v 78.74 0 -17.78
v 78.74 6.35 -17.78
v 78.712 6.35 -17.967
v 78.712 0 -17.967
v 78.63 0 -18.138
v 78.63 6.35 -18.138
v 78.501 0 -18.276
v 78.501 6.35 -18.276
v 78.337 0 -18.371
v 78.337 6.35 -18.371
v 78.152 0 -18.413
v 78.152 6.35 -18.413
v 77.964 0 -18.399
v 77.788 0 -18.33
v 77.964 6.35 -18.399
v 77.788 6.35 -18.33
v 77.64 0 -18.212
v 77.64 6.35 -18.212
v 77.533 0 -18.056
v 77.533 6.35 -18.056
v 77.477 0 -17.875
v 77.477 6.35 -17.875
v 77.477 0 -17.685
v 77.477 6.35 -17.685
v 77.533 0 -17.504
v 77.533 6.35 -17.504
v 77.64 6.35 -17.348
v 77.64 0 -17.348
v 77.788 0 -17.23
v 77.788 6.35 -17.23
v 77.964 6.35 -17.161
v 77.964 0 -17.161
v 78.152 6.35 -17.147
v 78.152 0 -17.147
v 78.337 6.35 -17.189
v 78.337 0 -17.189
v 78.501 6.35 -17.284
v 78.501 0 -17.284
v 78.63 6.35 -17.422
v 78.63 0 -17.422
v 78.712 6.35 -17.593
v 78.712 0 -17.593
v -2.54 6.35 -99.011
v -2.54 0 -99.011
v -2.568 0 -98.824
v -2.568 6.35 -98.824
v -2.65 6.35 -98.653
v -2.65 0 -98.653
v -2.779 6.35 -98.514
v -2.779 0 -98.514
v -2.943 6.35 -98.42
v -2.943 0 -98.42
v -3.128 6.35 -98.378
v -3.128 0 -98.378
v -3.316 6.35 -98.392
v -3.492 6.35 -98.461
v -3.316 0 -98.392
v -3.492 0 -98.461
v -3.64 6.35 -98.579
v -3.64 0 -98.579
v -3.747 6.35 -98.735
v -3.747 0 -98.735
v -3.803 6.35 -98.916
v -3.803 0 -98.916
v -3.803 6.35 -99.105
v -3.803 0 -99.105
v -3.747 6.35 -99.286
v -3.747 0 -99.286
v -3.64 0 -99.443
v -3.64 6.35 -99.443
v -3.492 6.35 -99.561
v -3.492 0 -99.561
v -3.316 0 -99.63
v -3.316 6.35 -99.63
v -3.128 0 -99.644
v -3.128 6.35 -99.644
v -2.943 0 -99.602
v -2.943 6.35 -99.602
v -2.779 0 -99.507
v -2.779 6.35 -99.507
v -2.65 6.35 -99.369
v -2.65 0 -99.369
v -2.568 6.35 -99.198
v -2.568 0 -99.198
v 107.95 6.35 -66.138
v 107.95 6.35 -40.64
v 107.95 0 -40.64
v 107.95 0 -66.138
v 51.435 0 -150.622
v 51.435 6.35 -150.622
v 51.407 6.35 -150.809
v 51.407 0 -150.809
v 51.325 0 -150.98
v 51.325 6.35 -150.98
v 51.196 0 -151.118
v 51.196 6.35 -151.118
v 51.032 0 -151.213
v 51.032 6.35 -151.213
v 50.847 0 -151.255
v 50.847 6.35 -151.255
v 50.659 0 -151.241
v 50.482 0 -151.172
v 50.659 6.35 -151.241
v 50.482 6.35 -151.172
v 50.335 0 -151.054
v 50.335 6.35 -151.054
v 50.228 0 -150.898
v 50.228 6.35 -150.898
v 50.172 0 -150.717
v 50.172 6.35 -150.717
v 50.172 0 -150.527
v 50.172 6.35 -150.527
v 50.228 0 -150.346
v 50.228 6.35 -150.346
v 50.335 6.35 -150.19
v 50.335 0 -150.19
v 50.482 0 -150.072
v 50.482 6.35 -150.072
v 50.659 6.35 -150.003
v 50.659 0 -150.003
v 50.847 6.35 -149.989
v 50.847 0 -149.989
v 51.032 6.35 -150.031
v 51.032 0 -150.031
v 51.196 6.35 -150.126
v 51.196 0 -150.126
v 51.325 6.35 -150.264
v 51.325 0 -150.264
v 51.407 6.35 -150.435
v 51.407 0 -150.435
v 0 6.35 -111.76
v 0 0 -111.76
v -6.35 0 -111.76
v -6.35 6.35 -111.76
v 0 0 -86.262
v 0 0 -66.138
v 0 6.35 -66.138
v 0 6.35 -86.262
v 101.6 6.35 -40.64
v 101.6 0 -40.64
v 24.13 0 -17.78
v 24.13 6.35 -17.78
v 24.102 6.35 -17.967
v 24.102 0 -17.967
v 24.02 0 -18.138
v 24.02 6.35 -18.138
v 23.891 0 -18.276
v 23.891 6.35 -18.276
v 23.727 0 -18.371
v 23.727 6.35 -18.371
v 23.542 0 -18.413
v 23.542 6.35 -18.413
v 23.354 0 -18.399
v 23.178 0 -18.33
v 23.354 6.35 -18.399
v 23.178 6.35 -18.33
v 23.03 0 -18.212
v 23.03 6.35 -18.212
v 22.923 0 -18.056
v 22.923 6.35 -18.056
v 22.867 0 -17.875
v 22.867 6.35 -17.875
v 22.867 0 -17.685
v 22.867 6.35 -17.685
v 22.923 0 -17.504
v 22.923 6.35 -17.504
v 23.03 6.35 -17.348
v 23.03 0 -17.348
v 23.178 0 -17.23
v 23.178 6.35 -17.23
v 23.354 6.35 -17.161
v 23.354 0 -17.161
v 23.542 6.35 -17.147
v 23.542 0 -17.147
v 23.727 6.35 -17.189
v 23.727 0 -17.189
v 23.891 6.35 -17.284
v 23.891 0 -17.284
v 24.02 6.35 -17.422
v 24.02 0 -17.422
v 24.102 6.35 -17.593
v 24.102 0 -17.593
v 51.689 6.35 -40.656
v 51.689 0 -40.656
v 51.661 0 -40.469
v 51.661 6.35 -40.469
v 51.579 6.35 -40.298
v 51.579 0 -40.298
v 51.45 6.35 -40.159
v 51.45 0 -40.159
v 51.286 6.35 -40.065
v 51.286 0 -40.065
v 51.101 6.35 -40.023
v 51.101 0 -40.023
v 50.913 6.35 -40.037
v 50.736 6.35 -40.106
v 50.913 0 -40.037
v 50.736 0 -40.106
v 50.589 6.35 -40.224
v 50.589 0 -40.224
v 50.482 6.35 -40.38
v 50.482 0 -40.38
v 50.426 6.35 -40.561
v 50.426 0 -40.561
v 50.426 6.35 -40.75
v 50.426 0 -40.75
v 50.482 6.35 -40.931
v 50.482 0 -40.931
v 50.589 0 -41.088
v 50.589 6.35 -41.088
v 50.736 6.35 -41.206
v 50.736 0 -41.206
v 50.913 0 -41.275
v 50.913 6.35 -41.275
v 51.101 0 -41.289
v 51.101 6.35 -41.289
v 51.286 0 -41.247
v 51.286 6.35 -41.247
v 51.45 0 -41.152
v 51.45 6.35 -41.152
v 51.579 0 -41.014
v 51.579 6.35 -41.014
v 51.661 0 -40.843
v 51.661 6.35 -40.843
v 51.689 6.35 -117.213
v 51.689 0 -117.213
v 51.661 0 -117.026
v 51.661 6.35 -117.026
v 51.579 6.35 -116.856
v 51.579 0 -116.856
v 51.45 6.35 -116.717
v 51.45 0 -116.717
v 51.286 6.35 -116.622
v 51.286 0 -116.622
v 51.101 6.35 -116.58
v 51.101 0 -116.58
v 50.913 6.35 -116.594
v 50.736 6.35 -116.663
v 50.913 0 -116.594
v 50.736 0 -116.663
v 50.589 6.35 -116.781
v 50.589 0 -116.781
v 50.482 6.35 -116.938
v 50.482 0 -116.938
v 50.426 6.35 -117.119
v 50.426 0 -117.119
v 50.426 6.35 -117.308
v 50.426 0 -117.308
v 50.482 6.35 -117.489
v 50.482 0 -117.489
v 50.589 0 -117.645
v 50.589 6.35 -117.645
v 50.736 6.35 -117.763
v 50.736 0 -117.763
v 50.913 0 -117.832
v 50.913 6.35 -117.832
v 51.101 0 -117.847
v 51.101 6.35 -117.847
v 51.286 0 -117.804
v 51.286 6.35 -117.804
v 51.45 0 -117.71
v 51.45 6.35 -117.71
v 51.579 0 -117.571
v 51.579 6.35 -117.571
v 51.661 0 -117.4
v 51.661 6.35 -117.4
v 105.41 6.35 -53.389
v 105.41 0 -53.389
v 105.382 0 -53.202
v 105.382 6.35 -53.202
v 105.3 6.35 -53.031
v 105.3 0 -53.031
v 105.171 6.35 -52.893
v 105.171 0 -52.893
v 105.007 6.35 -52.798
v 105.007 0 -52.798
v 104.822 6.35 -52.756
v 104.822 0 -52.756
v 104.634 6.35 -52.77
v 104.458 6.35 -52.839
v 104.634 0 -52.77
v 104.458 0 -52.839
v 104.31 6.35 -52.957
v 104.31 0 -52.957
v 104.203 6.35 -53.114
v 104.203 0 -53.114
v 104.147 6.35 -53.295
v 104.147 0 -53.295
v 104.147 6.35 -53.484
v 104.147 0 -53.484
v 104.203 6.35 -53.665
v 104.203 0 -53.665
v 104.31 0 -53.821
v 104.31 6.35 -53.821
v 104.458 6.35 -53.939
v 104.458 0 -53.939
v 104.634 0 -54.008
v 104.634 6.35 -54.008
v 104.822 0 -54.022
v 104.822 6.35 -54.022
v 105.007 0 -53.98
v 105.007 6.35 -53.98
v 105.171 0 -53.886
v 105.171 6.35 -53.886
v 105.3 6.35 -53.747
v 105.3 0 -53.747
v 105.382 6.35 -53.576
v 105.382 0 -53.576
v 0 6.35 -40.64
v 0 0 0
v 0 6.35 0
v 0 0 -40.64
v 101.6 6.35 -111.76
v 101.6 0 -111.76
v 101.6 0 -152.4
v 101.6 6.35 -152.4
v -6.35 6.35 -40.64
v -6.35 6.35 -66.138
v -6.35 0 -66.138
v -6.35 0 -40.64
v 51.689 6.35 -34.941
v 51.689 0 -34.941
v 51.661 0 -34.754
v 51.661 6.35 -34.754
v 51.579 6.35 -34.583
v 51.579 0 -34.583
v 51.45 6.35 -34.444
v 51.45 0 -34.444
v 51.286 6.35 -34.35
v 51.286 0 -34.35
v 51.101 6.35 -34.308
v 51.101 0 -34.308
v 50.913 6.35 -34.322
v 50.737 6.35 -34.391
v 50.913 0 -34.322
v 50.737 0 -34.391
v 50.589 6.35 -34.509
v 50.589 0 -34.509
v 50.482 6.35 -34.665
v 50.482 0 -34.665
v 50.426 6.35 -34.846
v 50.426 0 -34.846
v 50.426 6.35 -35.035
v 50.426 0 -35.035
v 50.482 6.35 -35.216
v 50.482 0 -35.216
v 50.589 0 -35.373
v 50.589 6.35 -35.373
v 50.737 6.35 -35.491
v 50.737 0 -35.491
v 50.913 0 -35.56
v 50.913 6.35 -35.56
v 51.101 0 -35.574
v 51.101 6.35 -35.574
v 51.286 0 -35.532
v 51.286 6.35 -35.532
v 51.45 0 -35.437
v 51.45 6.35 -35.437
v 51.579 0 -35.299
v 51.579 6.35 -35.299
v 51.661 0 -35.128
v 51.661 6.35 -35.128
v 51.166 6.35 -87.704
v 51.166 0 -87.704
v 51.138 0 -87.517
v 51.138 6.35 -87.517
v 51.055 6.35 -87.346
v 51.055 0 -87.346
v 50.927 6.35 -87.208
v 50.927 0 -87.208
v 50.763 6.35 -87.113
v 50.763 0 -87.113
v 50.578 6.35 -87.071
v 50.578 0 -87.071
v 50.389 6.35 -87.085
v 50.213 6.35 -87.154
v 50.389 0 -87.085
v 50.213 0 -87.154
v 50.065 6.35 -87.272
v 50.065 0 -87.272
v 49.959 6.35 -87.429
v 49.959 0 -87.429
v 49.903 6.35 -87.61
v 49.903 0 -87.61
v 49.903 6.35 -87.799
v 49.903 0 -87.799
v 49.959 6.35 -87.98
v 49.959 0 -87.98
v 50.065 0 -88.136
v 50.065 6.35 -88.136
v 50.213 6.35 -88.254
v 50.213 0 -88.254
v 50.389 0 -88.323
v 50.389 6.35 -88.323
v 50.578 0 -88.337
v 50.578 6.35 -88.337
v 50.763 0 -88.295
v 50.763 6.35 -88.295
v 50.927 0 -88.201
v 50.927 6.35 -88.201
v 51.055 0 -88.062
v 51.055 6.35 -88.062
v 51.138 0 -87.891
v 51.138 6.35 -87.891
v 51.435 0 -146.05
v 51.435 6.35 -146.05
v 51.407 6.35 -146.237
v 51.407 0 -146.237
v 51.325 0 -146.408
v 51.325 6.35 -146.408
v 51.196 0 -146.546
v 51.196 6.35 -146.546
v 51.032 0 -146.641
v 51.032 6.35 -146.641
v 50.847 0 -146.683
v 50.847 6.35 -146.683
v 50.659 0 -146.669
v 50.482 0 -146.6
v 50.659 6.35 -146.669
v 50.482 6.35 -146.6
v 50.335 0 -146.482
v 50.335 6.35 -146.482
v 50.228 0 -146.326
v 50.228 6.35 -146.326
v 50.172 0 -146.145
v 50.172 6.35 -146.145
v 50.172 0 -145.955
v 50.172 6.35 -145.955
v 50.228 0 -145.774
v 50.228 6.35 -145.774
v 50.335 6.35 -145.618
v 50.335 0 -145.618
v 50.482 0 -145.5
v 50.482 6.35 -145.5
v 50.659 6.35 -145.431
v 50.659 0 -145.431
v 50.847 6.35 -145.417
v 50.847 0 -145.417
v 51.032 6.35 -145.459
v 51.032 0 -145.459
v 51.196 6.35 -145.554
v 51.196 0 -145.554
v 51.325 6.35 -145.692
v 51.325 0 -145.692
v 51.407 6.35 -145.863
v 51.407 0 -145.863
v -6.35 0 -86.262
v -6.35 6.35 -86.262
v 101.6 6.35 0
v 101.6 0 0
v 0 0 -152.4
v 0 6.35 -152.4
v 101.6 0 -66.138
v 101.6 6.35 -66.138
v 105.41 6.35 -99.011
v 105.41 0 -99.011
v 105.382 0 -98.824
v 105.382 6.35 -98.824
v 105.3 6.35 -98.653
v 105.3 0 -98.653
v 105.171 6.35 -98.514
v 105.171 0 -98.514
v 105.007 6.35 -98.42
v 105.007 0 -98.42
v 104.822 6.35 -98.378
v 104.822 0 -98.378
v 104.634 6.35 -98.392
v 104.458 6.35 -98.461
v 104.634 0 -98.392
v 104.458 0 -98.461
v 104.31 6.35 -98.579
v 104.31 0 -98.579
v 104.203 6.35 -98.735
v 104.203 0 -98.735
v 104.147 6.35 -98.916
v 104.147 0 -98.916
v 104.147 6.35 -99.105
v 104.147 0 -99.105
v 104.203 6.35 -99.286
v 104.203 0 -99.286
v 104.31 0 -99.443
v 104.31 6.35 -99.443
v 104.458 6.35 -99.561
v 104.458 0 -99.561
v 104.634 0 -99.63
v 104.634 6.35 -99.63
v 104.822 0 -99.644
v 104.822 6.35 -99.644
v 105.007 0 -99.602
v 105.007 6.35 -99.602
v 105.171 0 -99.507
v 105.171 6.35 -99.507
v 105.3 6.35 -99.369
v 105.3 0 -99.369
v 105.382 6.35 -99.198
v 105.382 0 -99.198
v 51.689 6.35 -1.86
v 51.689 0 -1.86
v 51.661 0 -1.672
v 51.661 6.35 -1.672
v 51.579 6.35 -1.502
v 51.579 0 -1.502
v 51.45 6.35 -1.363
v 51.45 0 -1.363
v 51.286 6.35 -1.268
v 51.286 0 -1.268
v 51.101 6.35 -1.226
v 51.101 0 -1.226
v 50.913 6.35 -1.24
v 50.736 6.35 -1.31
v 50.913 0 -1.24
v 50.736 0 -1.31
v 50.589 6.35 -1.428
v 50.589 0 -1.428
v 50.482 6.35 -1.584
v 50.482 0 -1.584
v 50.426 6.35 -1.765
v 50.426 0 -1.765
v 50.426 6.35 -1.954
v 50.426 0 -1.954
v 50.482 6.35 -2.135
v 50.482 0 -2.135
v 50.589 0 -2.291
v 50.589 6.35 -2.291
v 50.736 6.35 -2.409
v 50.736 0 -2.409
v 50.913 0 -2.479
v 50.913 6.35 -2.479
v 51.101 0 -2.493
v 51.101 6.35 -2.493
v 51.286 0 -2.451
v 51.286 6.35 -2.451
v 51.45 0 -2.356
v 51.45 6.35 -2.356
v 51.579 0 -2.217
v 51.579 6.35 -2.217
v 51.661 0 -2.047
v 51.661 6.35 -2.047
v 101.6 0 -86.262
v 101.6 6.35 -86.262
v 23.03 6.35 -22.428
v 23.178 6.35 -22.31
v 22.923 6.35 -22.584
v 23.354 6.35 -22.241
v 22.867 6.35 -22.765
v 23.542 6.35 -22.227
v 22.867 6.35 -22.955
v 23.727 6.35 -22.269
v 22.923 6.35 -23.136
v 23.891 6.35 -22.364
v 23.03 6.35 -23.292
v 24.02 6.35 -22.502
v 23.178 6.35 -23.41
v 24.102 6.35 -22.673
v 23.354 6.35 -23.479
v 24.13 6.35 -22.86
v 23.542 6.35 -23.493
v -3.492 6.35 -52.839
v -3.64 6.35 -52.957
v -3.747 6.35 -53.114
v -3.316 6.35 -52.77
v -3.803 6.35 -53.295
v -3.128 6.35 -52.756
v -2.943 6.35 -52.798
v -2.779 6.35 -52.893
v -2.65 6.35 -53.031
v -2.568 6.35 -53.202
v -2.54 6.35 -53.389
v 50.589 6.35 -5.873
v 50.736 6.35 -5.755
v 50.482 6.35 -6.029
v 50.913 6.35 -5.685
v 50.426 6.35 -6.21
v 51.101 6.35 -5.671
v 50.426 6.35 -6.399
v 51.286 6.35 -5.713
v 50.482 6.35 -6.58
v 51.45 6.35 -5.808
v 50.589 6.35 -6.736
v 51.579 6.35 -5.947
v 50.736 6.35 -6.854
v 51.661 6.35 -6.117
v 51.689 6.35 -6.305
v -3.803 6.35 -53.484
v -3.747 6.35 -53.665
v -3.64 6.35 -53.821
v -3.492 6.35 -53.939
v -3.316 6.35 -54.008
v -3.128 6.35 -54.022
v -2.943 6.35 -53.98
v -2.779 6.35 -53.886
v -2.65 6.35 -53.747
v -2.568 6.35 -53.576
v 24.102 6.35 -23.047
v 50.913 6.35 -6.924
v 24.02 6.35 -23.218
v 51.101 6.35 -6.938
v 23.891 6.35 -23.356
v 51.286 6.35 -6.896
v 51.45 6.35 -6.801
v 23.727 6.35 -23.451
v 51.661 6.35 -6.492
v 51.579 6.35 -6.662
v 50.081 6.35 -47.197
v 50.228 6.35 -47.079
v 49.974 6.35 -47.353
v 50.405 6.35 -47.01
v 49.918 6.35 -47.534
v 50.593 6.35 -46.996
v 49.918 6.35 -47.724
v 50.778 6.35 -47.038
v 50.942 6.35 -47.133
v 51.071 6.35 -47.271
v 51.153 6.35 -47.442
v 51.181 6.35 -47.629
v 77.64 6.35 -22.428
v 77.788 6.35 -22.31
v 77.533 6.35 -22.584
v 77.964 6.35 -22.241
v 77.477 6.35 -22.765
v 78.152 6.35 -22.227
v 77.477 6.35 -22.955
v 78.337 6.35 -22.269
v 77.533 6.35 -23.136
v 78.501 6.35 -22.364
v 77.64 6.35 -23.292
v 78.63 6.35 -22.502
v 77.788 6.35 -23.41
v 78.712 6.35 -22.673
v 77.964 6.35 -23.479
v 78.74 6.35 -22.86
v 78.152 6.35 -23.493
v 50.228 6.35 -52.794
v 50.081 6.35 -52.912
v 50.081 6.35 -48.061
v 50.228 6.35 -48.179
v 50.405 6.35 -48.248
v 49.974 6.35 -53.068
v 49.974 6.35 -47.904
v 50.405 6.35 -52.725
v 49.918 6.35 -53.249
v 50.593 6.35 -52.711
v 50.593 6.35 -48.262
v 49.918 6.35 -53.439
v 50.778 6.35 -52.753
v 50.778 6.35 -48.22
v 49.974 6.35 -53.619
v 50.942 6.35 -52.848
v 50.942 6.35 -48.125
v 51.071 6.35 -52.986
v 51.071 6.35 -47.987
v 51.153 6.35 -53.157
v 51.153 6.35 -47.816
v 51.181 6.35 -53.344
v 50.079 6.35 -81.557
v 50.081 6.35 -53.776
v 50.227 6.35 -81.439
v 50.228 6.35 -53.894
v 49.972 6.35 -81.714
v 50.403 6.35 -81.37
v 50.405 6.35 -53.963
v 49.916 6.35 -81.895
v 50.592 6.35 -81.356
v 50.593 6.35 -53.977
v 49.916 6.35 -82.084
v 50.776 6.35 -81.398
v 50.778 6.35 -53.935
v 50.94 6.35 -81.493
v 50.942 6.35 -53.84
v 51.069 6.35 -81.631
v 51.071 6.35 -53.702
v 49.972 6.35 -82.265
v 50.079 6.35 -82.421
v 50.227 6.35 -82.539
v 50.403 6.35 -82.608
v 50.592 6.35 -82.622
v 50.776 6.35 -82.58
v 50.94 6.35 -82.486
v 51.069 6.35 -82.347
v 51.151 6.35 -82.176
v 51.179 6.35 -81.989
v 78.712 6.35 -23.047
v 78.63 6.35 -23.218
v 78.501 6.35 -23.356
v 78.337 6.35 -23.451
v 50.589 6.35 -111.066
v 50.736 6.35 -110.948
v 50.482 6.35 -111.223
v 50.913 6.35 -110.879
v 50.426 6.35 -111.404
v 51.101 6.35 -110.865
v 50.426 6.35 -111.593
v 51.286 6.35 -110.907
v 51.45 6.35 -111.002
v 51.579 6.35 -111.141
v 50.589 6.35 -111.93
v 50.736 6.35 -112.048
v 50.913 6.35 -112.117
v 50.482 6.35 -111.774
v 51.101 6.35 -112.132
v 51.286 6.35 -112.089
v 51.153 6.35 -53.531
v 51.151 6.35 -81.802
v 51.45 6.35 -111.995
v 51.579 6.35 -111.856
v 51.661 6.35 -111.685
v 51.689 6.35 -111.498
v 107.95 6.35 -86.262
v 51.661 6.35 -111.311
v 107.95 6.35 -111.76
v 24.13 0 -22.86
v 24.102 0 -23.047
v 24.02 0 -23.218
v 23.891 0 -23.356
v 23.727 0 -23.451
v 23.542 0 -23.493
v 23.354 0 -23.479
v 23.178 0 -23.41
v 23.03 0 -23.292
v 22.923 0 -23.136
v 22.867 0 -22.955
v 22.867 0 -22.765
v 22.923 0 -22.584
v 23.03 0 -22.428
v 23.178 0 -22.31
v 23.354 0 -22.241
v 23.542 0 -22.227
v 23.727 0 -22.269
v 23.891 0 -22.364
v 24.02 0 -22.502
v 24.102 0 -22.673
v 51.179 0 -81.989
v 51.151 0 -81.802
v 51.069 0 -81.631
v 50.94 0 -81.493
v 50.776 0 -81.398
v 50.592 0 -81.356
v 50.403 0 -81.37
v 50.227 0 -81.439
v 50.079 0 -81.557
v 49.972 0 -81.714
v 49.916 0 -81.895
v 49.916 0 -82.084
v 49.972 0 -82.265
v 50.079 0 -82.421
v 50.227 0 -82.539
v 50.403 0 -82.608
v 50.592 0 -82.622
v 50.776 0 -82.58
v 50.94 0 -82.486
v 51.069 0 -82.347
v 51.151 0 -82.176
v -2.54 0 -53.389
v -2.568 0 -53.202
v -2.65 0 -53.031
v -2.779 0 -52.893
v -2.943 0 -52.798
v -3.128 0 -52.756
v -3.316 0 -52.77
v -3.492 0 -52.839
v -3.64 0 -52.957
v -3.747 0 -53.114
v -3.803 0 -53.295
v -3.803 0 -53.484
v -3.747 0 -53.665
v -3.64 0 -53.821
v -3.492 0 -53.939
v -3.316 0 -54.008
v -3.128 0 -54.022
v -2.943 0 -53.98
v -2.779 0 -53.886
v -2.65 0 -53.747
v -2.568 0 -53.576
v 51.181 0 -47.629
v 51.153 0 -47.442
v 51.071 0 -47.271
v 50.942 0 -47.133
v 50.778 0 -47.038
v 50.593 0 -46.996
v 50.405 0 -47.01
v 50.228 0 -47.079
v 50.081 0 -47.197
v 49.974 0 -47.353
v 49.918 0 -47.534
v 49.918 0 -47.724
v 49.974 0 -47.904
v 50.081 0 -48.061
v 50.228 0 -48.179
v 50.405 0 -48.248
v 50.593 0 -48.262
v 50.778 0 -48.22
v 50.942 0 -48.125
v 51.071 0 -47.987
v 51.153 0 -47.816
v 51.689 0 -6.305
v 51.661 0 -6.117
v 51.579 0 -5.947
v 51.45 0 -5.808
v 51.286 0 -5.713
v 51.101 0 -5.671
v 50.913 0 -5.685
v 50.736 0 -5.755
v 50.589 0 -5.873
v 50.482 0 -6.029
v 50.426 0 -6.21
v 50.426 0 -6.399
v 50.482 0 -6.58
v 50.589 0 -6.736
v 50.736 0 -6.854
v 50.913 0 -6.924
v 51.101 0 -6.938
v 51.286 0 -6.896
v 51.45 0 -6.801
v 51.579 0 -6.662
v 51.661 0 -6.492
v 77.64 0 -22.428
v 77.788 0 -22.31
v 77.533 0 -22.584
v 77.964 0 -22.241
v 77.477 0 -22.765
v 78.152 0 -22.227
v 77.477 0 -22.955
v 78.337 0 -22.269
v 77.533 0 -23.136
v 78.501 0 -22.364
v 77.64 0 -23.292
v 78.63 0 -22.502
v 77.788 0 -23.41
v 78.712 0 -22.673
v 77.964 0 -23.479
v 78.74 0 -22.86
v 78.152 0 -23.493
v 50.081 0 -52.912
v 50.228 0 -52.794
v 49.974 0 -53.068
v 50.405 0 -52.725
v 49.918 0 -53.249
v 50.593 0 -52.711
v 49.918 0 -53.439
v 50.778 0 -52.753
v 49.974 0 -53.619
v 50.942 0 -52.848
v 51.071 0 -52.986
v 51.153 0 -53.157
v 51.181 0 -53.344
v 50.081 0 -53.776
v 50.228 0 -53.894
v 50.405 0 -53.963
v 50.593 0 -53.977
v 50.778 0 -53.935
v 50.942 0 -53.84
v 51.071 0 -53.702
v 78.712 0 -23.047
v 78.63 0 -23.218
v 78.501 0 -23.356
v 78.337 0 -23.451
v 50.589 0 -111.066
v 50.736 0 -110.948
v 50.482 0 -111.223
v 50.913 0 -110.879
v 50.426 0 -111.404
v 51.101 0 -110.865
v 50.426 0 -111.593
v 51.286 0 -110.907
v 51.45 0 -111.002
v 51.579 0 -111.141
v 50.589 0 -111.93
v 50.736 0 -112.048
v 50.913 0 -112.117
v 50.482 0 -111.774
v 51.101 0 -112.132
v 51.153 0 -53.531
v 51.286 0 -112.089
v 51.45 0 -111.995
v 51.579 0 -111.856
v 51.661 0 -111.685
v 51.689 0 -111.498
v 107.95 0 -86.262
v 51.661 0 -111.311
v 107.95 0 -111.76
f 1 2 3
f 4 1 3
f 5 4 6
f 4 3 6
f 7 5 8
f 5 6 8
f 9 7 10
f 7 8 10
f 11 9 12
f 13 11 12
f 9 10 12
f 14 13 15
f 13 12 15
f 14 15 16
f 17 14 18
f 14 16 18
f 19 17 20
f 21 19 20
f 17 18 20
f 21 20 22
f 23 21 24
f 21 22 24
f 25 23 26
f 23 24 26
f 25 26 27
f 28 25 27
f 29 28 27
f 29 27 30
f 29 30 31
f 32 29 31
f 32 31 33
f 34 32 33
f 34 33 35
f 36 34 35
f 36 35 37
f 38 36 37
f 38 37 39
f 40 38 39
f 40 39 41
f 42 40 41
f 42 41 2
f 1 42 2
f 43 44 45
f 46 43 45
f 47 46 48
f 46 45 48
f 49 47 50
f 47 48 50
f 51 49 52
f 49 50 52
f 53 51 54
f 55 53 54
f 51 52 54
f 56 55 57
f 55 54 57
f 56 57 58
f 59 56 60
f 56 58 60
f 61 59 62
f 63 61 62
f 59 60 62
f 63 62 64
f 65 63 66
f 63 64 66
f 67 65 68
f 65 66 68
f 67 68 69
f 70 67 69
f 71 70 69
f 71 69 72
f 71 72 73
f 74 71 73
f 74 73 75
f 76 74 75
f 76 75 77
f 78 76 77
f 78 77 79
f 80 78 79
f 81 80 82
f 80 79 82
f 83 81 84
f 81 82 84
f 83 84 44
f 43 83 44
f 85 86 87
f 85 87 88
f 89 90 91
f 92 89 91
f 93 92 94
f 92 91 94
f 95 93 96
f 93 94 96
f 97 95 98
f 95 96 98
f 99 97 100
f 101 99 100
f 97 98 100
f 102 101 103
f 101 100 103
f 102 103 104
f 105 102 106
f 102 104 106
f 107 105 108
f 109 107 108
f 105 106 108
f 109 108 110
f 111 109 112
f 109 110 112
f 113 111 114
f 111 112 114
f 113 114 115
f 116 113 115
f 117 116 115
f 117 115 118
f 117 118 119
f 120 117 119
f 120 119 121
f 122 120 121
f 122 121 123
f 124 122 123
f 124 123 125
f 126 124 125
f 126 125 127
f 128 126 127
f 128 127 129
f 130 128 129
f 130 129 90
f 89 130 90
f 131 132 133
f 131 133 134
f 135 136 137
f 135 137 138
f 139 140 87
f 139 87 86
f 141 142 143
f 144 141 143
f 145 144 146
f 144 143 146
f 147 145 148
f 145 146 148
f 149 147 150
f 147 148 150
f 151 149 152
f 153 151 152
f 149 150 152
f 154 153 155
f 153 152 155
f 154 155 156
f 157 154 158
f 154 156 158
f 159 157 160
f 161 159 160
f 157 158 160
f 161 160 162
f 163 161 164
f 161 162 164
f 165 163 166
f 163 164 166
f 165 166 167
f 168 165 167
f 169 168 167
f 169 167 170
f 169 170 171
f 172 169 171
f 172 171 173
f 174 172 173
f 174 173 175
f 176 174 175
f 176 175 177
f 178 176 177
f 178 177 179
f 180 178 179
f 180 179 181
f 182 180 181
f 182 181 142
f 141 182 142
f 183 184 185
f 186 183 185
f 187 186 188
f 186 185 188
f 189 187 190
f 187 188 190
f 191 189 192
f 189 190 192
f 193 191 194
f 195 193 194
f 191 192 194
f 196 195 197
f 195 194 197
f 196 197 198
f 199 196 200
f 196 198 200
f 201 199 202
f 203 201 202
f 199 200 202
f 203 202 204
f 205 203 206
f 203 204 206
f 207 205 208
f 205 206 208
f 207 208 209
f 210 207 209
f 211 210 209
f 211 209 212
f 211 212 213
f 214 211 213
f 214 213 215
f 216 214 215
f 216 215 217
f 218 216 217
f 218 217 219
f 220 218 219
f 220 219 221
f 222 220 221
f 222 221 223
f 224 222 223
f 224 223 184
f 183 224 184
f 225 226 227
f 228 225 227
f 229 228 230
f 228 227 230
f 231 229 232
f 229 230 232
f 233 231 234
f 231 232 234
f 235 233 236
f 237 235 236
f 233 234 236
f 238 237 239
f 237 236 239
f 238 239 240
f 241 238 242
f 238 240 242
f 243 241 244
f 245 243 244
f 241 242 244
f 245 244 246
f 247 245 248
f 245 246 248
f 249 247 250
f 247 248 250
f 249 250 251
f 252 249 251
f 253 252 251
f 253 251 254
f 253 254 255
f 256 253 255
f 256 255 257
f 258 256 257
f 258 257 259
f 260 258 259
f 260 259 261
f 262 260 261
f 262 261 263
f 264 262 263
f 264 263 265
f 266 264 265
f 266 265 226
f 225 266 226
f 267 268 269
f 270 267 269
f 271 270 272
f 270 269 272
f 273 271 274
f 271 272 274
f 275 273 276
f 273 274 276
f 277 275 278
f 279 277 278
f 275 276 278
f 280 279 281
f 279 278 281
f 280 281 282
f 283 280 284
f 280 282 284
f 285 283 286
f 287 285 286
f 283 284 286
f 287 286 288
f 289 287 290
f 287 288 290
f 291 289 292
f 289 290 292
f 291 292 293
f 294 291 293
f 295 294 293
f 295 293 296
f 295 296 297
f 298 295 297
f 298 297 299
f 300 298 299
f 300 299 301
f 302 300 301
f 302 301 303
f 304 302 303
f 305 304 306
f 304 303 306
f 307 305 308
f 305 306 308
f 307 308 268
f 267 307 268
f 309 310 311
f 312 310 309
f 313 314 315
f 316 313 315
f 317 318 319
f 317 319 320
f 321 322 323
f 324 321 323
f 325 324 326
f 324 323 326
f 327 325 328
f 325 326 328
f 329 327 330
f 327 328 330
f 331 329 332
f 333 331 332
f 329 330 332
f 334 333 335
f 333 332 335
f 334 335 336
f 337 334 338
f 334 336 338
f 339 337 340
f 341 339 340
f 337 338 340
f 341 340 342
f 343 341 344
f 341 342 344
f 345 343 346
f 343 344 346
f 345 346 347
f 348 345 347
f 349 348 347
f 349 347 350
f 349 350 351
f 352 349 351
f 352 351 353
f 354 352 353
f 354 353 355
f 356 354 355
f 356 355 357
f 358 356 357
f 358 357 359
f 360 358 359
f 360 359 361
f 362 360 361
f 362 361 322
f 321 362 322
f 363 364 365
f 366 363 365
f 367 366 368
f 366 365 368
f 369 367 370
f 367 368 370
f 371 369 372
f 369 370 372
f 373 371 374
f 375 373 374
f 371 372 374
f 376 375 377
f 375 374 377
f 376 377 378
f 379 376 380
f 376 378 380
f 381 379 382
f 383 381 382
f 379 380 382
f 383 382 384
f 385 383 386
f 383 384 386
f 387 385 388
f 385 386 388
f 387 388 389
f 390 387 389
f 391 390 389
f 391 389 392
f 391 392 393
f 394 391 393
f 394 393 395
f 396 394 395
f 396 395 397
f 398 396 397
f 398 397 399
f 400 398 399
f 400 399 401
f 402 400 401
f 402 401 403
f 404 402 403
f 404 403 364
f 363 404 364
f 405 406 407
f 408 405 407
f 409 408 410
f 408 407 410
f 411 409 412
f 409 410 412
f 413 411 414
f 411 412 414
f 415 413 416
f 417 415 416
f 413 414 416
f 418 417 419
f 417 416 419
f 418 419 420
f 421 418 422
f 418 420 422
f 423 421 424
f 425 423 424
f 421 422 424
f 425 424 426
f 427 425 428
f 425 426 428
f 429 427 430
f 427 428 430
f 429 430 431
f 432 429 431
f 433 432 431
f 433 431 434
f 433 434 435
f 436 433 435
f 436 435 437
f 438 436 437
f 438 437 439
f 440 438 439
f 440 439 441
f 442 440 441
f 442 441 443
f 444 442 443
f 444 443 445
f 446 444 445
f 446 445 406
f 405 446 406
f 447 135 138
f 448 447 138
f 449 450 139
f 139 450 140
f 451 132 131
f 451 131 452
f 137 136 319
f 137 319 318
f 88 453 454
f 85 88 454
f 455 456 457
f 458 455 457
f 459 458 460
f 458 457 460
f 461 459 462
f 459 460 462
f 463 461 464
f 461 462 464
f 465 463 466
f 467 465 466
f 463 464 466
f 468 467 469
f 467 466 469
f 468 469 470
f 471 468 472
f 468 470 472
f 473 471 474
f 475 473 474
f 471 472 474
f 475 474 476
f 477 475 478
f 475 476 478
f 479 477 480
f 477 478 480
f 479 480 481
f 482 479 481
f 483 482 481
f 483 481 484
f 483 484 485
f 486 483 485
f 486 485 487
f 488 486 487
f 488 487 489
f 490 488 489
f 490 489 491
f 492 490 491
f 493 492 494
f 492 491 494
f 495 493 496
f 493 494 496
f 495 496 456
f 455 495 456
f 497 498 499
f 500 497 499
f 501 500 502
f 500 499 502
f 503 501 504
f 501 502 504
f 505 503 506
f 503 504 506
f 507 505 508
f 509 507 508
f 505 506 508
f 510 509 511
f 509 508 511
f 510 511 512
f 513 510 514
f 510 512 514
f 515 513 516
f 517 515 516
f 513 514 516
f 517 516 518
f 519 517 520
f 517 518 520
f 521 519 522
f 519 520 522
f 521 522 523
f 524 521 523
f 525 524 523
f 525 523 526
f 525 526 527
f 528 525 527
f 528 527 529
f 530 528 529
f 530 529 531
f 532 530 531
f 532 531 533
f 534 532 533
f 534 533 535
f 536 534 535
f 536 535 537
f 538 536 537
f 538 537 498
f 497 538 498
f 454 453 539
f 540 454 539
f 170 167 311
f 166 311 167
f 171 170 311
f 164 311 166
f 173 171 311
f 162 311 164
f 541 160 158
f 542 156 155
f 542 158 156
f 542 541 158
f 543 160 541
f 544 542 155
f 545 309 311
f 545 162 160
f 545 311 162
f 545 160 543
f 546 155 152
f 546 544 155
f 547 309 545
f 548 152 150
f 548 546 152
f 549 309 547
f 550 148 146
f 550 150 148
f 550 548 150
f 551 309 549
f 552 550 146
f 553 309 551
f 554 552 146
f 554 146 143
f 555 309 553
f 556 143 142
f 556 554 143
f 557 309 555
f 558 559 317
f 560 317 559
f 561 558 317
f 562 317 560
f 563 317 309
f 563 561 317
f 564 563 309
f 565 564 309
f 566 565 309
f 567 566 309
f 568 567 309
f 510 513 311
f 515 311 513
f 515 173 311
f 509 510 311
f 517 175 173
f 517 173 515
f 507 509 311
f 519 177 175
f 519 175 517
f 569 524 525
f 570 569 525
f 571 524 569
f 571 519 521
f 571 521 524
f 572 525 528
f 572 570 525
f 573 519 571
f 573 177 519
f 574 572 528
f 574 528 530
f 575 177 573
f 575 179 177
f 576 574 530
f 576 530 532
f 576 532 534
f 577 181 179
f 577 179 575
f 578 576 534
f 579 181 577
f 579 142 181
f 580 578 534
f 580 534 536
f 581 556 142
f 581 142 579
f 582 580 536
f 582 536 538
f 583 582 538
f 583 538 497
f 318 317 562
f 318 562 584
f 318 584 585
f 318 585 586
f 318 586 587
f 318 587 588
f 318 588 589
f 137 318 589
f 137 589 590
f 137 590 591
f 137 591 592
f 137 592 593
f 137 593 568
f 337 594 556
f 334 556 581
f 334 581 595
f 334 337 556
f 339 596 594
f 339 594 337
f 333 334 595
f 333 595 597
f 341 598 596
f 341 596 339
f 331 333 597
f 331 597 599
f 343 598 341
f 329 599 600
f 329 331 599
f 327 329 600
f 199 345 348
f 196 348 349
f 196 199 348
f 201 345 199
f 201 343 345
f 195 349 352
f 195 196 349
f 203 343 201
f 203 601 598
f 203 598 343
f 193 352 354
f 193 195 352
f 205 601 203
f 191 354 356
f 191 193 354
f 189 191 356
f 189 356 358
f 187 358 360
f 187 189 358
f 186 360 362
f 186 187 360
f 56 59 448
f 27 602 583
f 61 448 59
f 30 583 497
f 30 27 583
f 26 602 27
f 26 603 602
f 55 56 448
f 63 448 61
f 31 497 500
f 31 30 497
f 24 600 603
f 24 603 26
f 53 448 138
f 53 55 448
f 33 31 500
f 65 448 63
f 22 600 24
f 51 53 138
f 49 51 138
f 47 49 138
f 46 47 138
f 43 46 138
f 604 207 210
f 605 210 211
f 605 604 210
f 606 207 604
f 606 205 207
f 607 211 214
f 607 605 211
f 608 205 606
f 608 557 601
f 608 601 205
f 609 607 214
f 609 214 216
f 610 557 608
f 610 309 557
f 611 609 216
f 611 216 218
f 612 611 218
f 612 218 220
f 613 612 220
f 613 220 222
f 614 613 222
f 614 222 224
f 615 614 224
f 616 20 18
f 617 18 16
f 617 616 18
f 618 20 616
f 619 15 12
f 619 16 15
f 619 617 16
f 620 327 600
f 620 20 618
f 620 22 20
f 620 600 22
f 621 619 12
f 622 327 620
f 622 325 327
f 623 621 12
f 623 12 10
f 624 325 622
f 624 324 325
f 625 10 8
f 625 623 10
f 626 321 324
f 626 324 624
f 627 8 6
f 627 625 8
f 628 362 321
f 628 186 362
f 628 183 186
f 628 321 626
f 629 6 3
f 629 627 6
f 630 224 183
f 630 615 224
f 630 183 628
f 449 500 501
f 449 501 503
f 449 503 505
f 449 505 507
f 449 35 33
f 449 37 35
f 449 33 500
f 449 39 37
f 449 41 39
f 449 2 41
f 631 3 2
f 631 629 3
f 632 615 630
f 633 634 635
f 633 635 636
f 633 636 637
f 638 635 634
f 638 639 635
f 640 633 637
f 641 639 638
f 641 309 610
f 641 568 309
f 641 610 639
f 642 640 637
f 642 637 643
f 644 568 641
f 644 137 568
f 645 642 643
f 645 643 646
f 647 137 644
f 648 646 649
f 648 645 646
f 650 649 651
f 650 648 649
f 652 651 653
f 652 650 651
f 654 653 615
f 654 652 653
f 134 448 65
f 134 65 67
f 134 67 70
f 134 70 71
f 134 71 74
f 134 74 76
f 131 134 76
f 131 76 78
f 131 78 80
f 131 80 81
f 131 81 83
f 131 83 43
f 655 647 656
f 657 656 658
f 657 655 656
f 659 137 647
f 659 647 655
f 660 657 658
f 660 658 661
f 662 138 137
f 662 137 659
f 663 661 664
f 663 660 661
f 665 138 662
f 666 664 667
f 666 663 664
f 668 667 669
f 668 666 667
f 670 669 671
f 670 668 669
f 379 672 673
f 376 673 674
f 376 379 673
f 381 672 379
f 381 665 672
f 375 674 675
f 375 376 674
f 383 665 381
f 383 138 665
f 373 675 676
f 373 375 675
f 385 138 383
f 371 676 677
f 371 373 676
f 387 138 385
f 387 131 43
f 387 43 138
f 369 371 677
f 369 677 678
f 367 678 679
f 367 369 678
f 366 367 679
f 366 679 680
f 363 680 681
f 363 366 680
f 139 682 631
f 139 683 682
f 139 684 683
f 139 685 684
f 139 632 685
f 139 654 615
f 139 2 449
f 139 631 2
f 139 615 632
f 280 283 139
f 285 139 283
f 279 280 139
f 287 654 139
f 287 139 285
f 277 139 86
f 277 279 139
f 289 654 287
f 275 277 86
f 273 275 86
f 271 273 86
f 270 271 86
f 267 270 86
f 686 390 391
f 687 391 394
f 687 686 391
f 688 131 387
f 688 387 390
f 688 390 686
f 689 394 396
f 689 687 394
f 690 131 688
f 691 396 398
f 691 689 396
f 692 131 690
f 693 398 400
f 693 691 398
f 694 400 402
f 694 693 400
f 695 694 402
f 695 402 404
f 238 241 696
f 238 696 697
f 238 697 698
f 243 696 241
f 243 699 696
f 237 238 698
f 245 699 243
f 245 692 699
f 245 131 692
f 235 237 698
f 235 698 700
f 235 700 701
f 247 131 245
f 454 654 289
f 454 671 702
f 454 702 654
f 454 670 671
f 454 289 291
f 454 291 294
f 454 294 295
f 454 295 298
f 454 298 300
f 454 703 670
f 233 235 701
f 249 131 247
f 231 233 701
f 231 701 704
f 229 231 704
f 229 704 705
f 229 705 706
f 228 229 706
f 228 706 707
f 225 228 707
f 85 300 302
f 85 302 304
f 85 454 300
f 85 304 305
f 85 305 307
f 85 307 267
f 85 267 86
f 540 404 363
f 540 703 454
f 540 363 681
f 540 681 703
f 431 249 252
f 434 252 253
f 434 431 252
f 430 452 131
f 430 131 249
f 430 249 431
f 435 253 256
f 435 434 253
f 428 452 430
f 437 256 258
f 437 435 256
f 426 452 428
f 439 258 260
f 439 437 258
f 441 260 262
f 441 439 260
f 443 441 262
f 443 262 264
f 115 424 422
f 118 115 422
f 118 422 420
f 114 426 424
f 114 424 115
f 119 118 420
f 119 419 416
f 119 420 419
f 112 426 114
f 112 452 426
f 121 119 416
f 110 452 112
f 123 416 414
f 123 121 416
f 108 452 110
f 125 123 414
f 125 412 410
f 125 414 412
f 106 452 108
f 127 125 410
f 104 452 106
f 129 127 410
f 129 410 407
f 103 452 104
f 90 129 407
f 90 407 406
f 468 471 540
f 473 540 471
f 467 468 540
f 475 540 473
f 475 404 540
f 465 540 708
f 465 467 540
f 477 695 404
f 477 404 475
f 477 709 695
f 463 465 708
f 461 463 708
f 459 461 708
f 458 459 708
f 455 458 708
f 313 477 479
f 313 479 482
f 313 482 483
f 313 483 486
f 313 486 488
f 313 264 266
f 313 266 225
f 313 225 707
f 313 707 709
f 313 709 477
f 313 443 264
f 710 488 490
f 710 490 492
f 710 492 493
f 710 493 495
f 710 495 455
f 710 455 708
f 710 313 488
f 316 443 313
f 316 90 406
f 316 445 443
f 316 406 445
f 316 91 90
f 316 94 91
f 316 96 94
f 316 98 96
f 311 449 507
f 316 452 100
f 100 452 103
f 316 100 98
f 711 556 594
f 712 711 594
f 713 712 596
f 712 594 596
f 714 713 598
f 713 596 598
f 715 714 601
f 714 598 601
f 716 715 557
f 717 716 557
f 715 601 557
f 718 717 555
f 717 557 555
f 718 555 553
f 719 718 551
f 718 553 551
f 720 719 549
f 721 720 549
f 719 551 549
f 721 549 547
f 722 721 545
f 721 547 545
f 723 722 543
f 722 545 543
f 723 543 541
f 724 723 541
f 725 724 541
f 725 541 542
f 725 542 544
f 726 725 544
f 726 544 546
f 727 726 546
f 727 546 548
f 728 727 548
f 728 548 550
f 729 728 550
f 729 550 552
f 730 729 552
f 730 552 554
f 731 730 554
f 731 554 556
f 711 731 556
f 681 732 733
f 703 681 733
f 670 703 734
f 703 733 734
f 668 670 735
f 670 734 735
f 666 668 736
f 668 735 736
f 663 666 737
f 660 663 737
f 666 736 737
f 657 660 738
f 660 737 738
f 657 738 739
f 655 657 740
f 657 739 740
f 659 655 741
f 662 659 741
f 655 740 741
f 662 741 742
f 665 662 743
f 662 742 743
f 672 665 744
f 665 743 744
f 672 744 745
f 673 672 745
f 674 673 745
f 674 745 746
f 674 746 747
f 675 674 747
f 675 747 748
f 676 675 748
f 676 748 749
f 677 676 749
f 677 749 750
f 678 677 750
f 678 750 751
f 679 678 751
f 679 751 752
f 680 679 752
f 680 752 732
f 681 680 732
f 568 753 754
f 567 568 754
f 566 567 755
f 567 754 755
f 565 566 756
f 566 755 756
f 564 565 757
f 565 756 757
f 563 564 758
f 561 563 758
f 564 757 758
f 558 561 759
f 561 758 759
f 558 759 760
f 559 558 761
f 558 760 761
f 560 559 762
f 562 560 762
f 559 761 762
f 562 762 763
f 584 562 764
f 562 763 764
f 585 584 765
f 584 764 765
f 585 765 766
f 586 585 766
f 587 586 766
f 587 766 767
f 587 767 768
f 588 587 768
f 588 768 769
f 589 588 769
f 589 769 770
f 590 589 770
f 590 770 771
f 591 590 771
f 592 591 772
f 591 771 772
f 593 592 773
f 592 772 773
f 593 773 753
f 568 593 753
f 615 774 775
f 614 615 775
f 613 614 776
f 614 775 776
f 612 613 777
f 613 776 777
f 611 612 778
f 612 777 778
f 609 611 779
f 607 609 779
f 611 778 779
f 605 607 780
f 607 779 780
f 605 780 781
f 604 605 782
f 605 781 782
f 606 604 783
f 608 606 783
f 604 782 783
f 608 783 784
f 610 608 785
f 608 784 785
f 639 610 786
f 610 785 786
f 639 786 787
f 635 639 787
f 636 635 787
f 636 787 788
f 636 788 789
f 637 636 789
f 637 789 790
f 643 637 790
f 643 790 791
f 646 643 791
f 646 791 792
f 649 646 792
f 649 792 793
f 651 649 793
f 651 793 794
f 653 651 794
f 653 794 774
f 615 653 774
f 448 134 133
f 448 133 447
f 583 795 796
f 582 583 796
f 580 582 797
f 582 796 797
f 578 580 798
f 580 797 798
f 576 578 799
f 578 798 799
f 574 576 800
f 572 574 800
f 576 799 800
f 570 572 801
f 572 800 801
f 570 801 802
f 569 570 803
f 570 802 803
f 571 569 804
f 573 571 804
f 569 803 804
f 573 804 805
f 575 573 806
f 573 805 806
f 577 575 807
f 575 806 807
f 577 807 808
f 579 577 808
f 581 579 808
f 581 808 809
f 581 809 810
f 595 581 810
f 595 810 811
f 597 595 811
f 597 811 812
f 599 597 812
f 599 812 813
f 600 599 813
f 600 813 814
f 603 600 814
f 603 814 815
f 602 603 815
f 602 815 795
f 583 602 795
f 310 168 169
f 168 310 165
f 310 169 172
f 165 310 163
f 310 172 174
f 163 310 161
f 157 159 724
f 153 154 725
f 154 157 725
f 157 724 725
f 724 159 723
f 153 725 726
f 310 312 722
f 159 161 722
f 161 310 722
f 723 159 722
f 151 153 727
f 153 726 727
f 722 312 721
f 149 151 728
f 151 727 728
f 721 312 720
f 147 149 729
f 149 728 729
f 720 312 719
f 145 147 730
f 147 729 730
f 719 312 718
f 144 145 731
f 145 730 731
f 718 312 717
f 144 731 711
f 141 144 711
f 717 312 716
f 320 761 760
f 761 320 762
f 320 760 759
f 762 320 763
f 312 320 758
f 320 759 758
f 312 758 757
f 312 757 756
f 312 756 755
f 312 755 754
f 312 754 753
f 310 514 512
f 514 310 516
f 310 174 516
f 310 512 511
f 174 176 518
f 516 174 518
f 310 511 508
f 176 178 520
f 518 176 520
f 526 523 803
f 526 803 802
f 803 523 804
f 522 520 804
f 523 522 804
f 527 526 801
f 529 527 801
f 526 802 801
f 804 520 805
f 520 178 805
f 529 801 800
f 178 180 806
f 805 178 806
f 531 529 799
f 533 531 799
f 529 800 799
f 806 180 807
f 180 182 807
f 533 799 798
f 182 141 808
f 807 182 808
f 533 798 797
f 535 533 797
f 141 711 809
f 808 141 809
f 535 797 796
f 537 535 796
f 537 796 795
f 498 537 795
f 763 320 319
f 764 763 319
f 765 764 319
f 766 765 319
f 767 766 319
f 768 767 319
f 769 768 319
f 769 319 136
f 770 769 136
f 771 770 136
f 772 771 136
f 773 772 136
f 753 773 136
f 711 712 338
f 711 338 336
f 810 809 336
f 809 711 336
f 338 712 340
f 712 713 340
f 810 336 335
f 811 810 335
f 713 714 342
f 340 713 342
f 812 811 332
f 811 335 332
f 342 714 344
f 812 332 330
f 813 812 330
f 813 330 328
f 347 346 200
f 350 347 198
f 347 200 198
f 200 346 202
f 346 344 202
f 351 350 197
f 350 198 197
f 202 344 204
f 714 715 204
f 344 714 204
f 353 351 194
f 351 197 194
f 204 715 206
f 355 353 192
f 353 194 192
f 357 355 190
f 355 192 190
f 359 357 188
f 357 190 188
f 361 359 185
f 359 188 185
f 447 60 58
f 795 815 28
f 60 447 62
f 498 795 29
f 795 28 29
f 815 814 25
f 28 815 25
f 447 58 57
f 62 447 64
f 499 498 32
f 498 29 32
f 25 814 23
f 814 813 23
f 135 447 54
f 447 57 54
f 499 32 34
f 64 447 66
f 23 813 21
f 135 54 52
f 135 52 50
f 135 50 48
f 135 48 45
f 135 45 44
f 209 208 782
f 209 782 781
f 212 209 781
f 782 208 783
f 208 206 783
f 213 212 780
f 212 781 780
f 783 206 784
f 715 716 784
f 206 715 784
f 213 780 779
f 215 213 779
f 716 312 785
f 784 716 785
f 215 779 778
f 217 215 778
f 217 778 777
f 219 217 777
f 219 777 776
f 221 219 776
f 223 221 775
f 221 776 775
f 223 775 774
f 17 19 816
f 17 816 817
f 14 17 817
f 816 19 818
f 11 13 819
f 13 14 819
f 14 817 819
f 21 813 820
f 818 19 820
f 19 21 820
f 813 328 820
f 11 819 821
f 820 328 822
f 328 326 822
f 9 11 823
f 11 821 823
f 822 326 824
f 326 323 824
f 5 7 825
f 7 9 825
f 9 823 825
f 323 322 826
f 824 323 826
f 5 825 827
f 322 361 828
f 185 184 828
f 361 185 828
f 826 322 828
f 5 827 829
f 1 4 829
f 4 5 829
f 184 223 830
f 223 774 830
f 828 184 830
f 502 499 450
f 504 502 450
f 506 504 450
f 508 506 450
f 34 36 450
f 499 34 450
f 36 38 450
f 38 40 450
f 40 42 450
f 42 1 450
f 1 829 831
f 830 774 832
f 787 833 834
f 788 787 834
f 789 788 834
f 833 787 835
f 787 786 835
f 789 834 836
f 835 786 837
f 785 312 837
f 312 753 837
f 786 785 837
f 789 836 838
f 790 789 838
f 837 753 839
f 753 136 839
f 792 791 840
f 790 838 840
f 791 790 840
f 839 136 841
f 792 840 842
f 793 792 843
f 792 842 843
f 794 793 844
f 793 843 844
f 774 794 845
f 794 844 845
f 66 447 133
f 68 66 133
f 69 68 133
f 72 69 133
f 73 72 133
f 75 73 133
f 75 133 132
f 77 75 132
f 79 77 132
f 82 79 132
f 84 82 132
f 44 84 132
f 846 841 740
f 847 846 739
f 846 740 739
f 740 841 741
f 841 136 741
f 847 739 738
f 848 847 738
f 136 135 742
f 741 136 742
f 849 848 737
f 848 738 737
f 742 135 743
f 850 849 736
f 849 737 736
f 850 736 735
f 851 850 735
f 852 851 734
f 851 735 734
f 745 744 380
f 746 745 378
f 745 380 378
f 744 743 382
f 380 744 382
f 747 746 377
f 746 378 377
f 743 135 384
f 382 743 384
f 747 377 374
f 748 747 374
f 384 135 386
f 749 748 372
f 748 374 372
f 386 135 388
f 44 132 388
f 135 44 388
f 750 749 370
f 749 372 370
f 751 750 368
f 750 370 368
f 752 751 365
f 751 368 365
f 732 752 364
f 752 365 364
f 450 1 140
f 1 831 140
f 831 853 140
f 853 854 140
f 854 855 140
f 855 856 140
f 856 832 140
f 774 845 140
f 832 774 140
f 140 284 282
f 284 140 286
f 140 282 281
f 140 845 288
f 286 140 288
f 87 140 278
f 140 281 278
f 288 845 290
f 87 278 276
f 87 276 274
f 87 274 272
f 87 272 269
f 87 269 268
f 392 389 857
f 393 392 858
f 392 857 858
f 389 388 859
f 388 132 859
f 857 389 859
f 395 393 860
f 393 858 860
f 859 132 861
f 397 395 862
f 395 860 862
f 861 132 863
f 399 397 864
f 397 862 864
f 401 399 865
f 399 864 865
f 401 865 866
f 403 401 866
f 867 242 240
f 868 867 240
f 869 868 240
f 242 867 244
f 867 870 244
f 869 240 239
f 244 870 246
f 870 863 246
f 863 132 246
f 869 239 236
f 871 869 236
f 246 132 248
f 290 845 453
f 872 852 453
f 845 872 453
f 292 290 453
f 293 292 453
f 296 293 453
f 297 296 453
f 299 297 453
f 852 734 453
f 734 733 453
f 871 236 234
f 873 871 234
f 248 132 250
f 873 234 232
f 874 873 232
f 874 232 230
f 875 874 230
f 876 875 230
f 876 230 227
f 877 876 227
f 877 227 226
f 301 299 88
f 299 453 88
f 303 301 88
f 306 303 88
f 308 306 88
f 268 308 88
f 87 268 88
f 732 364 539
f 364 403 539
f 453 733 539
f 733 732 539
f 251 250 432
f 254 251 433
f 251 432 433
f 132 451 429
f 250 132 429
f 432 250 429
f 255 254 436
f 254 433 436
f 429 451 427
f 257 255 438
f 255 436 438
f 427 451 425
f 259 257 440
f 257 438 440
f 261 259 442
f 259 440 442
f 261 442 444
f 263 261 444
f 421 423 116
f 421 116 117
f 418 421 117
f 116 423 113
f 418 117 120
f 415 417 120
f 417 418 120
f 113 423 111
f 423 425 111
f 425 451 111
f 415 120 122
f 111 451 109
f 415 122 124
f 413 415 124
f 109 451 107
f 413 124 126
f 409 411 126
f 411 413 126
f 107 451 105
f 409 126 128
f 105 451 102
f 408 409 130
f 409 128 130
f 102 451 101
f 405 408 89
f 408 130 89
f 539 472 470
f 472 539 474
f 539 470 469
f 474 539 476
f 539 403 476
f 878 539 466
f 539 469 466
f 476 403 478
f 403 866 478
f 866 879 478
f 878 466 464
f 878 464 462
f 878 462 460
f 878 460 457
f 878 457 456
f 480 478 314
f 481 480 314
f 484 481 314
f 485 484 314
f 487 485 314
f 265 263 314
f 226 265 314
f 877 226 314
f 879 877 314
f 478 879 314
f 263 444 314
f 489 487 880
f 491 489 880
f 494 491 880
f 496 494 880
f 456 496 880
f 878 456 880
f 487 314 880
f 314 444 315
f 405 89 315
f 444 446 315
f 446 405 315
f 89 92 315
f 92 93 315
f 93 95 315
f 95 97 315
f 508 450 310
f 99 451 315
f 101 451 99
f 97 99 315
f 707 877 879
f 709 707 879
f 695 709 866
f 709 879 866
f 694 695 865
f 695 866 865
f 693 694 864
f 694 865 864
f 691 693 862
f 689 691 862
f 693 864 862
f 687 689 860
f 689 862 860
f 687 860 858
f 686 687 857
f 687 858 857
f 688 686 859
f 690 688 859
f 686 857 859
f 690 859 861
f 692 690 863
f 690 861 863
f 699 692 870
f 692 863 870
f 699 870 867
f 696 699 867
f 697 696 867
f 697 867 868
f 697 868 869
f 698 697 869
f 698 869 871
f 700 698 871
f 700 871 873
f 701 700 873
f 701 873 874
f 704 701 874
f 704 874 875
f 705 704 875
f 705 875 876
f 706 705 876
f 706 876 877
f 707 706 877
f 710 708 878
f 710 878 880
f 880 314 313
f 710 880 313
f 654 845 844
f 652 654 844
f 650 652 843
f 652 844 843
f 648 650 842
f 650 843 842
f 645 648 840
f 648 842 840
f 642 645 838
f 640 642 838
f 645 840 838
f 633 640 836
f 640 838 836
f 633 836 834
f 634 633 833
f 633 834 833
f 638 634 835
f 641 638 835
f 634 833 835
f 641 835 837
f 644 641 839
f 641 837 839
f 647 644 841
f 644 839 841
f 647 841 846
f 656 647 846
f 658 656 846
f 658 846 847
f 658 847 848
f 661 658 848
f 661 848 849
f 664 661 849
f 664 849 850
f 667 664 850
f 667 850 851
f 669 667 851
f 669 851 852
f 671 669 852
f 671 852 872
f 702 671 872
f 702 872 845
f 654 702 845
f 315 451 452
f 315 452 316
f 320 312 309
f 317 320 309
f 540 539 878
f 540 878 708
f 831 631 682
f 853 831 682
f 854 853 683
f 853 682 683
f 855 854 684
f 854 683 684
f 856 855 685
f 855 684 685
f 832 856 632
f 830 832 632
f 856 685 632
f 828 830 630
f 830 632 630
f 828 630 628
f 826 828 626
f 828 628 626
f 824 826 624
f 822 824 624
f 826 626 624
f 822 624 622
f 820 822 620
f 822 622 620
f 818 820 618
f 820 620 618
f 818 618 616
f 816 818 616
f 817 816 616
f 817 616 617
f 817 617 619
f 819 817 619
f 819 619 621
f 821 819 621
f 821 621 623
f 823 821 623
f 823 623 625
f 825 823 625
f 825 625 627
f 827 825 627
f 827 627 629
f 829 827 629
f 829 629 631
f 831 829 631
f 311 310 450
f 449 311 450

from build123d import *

# Parameters (mm, degrees)
SKETCH1_W           = 101.6
SKETCH1_H           = 152.4
BOSS_EXTRUDE1_DEPTH = 6.35
SKETCH2_W           = 25.498289586
SKETCH2_H           = 6.35
BOSS_EXTRUDE2_DEPTH = 6.35
SKETCH3_W           = 25.498289586
SKETCH3_H           = 6.35
BOSS_EXTRUDE3_DEPTH = 6.35
SKETCH4_R           = 0.635
CUT_EXTRUDE1_DEPTH  = 6.35
SKETCH5_R           = 0.635
CUT_EXTRUDE2_DEPTH  = 7.35
SKETCH7_R           = 0.635
CUT_EXTRUDE3_DEPTH  = 7.35
SKETCH9_R           = 0.635
CUT_EXTRUDE4_DEPTH  = 7.35


with BuildPart() as part:
    # Sketch1 → Boss-Extrude1 (new body)
    with BuildSketch(Plane(origin=(0, 0, 0), x_dir=(1, 0, 0), z_dir=(0, 1, 0))):
        with Locations((50.8, 76.2)):
            Rectangle(SKETCH1_W, SKETCH1_H)
    extrude(amount=BOSS_EXTRUDE1_DEPTH)

    # Sketch2 → Boss-Extrude2 (add)
    with BuildSketch(Plane(origin=(101.6, 0, 0), x_dir=(0, 0, -1), z_dir=(1, 0, 0))):
        with Locations((53.389144793, 3.175)):
            Rectangle(SKETCH2_W, SKETCH2_H)
        with Locations((99.010855207, 3.175)):
            Rectangle(SKETCH2_W, SKETCH2_H)
    extrude(amount=BOSS_EXTRUDE2_DEPTH)

    # Sketch3 → Boss-Extrude3 (add)
    with BuildSketch(Plane.ZY):
        with Locations((-99.010855207, 3.175)):
            Rectangle(SKETCH3_W, SKETCH3_H)
        with Locations((-53.389144793, 3.175)):
            Rectangle(SKETCH3_W, SKETCH3_H)
    extrude(amount=BOSS_EXTRUDE3_DEPTH)

    # Sketch4 → Cut-Extrude1 (cut)
    with BuildSketch(Plane.XZ):
        with Locations((-3.175, -53.389144793)):
            Circle(SKETCH4_R)
        with Locations((-3.175, -99.010855207)):
            Circle(SKETCH4_R)
        with Locations((104.775, -53.389144793)):
            Circle(SKETCH4_R)
        with Locations((104.775, -99.010855207)):
            Circle(SKETCH4_R)
    extrude(amount=-CUT_EXTRUDE1_DEPTH, mode=Mode.SUBTRACT)

    # Sketch5 → Cut-Extrude2 (cut, through all)
    with BuildSketch(Plane.XZ):
        with Locations((51.054, -6.304558397)):
            Circle(SKETCH5_R)
        with Locations((51.054001096, -34.940813016)):
            Circle(SKETCH5_R)
        with Locations((51.054, -40.655813016)):
            Circle(SKETCH5_R)
        with Locations((51.054, -1.859558397)):
            Circle(SKETCH5_R)
        with Locations((50.530750765, -87.704154674)):
            Circle(SKETCH5_R)
        with Locations((50.546, -47.628968946)):
            Circle(SKETCH5_R)
        with Locations((50.546, -53.343968946)):
            Circle(SKETCH5_R)
        with Locations((50.544258636, -81.989170638)):
            Circle(SKETCH5_R)
        with Locations((51.054, -111.498317742)):
            Circle(SKETCH5_R)
        with Locations((51.054, -117.213317742)):
            Circle(SKETCH5_R)
    extrude(amount=-CUT_EXTRUDE2_DEPTH, mode=Mode.SUBTRACT)

    # Sketch7 → Cut-Extrude3 (cut, through all)
    with BuildSketch(Plane(origin=(0, 6.35, 0), x_dir=(1, 0, 0), z_dir=(0, 1, 0))):
        with Locations((23.495, 17.78)):
            Circle(SKETCH7_R)
        with Locations((23.495, 22.86)):
            Circle(SKETCH7_R)
        with Locations((78.105, 22.86)):
            Circle(SKETCH7_R)
        with Locations((78.105, 17.78)):
            Circle(SKETCH7_R)
    extrude(amount=-CUT_EXTRUDE3_DEPTH, mode=Mode.SUBTRACT)

    # Sketch9 → Cut-Extrude4 (cut, through all)
    with BuildSketch(Plane(origin=(0, 6.35, 0), x_dir=(1, 0, 0), z_dir=(0, 1, 0))):
        with Locations((50.8, 150.622)):
            Circle(SKETCH9_R)
        with Locations((50.8, 146.05)):
            Circle(SKETCH9_R)
    extrude(amount=-CUT_EXTRUDE4_DEPTH, mode=Mode.SUBTRACT)


solid = part.part
